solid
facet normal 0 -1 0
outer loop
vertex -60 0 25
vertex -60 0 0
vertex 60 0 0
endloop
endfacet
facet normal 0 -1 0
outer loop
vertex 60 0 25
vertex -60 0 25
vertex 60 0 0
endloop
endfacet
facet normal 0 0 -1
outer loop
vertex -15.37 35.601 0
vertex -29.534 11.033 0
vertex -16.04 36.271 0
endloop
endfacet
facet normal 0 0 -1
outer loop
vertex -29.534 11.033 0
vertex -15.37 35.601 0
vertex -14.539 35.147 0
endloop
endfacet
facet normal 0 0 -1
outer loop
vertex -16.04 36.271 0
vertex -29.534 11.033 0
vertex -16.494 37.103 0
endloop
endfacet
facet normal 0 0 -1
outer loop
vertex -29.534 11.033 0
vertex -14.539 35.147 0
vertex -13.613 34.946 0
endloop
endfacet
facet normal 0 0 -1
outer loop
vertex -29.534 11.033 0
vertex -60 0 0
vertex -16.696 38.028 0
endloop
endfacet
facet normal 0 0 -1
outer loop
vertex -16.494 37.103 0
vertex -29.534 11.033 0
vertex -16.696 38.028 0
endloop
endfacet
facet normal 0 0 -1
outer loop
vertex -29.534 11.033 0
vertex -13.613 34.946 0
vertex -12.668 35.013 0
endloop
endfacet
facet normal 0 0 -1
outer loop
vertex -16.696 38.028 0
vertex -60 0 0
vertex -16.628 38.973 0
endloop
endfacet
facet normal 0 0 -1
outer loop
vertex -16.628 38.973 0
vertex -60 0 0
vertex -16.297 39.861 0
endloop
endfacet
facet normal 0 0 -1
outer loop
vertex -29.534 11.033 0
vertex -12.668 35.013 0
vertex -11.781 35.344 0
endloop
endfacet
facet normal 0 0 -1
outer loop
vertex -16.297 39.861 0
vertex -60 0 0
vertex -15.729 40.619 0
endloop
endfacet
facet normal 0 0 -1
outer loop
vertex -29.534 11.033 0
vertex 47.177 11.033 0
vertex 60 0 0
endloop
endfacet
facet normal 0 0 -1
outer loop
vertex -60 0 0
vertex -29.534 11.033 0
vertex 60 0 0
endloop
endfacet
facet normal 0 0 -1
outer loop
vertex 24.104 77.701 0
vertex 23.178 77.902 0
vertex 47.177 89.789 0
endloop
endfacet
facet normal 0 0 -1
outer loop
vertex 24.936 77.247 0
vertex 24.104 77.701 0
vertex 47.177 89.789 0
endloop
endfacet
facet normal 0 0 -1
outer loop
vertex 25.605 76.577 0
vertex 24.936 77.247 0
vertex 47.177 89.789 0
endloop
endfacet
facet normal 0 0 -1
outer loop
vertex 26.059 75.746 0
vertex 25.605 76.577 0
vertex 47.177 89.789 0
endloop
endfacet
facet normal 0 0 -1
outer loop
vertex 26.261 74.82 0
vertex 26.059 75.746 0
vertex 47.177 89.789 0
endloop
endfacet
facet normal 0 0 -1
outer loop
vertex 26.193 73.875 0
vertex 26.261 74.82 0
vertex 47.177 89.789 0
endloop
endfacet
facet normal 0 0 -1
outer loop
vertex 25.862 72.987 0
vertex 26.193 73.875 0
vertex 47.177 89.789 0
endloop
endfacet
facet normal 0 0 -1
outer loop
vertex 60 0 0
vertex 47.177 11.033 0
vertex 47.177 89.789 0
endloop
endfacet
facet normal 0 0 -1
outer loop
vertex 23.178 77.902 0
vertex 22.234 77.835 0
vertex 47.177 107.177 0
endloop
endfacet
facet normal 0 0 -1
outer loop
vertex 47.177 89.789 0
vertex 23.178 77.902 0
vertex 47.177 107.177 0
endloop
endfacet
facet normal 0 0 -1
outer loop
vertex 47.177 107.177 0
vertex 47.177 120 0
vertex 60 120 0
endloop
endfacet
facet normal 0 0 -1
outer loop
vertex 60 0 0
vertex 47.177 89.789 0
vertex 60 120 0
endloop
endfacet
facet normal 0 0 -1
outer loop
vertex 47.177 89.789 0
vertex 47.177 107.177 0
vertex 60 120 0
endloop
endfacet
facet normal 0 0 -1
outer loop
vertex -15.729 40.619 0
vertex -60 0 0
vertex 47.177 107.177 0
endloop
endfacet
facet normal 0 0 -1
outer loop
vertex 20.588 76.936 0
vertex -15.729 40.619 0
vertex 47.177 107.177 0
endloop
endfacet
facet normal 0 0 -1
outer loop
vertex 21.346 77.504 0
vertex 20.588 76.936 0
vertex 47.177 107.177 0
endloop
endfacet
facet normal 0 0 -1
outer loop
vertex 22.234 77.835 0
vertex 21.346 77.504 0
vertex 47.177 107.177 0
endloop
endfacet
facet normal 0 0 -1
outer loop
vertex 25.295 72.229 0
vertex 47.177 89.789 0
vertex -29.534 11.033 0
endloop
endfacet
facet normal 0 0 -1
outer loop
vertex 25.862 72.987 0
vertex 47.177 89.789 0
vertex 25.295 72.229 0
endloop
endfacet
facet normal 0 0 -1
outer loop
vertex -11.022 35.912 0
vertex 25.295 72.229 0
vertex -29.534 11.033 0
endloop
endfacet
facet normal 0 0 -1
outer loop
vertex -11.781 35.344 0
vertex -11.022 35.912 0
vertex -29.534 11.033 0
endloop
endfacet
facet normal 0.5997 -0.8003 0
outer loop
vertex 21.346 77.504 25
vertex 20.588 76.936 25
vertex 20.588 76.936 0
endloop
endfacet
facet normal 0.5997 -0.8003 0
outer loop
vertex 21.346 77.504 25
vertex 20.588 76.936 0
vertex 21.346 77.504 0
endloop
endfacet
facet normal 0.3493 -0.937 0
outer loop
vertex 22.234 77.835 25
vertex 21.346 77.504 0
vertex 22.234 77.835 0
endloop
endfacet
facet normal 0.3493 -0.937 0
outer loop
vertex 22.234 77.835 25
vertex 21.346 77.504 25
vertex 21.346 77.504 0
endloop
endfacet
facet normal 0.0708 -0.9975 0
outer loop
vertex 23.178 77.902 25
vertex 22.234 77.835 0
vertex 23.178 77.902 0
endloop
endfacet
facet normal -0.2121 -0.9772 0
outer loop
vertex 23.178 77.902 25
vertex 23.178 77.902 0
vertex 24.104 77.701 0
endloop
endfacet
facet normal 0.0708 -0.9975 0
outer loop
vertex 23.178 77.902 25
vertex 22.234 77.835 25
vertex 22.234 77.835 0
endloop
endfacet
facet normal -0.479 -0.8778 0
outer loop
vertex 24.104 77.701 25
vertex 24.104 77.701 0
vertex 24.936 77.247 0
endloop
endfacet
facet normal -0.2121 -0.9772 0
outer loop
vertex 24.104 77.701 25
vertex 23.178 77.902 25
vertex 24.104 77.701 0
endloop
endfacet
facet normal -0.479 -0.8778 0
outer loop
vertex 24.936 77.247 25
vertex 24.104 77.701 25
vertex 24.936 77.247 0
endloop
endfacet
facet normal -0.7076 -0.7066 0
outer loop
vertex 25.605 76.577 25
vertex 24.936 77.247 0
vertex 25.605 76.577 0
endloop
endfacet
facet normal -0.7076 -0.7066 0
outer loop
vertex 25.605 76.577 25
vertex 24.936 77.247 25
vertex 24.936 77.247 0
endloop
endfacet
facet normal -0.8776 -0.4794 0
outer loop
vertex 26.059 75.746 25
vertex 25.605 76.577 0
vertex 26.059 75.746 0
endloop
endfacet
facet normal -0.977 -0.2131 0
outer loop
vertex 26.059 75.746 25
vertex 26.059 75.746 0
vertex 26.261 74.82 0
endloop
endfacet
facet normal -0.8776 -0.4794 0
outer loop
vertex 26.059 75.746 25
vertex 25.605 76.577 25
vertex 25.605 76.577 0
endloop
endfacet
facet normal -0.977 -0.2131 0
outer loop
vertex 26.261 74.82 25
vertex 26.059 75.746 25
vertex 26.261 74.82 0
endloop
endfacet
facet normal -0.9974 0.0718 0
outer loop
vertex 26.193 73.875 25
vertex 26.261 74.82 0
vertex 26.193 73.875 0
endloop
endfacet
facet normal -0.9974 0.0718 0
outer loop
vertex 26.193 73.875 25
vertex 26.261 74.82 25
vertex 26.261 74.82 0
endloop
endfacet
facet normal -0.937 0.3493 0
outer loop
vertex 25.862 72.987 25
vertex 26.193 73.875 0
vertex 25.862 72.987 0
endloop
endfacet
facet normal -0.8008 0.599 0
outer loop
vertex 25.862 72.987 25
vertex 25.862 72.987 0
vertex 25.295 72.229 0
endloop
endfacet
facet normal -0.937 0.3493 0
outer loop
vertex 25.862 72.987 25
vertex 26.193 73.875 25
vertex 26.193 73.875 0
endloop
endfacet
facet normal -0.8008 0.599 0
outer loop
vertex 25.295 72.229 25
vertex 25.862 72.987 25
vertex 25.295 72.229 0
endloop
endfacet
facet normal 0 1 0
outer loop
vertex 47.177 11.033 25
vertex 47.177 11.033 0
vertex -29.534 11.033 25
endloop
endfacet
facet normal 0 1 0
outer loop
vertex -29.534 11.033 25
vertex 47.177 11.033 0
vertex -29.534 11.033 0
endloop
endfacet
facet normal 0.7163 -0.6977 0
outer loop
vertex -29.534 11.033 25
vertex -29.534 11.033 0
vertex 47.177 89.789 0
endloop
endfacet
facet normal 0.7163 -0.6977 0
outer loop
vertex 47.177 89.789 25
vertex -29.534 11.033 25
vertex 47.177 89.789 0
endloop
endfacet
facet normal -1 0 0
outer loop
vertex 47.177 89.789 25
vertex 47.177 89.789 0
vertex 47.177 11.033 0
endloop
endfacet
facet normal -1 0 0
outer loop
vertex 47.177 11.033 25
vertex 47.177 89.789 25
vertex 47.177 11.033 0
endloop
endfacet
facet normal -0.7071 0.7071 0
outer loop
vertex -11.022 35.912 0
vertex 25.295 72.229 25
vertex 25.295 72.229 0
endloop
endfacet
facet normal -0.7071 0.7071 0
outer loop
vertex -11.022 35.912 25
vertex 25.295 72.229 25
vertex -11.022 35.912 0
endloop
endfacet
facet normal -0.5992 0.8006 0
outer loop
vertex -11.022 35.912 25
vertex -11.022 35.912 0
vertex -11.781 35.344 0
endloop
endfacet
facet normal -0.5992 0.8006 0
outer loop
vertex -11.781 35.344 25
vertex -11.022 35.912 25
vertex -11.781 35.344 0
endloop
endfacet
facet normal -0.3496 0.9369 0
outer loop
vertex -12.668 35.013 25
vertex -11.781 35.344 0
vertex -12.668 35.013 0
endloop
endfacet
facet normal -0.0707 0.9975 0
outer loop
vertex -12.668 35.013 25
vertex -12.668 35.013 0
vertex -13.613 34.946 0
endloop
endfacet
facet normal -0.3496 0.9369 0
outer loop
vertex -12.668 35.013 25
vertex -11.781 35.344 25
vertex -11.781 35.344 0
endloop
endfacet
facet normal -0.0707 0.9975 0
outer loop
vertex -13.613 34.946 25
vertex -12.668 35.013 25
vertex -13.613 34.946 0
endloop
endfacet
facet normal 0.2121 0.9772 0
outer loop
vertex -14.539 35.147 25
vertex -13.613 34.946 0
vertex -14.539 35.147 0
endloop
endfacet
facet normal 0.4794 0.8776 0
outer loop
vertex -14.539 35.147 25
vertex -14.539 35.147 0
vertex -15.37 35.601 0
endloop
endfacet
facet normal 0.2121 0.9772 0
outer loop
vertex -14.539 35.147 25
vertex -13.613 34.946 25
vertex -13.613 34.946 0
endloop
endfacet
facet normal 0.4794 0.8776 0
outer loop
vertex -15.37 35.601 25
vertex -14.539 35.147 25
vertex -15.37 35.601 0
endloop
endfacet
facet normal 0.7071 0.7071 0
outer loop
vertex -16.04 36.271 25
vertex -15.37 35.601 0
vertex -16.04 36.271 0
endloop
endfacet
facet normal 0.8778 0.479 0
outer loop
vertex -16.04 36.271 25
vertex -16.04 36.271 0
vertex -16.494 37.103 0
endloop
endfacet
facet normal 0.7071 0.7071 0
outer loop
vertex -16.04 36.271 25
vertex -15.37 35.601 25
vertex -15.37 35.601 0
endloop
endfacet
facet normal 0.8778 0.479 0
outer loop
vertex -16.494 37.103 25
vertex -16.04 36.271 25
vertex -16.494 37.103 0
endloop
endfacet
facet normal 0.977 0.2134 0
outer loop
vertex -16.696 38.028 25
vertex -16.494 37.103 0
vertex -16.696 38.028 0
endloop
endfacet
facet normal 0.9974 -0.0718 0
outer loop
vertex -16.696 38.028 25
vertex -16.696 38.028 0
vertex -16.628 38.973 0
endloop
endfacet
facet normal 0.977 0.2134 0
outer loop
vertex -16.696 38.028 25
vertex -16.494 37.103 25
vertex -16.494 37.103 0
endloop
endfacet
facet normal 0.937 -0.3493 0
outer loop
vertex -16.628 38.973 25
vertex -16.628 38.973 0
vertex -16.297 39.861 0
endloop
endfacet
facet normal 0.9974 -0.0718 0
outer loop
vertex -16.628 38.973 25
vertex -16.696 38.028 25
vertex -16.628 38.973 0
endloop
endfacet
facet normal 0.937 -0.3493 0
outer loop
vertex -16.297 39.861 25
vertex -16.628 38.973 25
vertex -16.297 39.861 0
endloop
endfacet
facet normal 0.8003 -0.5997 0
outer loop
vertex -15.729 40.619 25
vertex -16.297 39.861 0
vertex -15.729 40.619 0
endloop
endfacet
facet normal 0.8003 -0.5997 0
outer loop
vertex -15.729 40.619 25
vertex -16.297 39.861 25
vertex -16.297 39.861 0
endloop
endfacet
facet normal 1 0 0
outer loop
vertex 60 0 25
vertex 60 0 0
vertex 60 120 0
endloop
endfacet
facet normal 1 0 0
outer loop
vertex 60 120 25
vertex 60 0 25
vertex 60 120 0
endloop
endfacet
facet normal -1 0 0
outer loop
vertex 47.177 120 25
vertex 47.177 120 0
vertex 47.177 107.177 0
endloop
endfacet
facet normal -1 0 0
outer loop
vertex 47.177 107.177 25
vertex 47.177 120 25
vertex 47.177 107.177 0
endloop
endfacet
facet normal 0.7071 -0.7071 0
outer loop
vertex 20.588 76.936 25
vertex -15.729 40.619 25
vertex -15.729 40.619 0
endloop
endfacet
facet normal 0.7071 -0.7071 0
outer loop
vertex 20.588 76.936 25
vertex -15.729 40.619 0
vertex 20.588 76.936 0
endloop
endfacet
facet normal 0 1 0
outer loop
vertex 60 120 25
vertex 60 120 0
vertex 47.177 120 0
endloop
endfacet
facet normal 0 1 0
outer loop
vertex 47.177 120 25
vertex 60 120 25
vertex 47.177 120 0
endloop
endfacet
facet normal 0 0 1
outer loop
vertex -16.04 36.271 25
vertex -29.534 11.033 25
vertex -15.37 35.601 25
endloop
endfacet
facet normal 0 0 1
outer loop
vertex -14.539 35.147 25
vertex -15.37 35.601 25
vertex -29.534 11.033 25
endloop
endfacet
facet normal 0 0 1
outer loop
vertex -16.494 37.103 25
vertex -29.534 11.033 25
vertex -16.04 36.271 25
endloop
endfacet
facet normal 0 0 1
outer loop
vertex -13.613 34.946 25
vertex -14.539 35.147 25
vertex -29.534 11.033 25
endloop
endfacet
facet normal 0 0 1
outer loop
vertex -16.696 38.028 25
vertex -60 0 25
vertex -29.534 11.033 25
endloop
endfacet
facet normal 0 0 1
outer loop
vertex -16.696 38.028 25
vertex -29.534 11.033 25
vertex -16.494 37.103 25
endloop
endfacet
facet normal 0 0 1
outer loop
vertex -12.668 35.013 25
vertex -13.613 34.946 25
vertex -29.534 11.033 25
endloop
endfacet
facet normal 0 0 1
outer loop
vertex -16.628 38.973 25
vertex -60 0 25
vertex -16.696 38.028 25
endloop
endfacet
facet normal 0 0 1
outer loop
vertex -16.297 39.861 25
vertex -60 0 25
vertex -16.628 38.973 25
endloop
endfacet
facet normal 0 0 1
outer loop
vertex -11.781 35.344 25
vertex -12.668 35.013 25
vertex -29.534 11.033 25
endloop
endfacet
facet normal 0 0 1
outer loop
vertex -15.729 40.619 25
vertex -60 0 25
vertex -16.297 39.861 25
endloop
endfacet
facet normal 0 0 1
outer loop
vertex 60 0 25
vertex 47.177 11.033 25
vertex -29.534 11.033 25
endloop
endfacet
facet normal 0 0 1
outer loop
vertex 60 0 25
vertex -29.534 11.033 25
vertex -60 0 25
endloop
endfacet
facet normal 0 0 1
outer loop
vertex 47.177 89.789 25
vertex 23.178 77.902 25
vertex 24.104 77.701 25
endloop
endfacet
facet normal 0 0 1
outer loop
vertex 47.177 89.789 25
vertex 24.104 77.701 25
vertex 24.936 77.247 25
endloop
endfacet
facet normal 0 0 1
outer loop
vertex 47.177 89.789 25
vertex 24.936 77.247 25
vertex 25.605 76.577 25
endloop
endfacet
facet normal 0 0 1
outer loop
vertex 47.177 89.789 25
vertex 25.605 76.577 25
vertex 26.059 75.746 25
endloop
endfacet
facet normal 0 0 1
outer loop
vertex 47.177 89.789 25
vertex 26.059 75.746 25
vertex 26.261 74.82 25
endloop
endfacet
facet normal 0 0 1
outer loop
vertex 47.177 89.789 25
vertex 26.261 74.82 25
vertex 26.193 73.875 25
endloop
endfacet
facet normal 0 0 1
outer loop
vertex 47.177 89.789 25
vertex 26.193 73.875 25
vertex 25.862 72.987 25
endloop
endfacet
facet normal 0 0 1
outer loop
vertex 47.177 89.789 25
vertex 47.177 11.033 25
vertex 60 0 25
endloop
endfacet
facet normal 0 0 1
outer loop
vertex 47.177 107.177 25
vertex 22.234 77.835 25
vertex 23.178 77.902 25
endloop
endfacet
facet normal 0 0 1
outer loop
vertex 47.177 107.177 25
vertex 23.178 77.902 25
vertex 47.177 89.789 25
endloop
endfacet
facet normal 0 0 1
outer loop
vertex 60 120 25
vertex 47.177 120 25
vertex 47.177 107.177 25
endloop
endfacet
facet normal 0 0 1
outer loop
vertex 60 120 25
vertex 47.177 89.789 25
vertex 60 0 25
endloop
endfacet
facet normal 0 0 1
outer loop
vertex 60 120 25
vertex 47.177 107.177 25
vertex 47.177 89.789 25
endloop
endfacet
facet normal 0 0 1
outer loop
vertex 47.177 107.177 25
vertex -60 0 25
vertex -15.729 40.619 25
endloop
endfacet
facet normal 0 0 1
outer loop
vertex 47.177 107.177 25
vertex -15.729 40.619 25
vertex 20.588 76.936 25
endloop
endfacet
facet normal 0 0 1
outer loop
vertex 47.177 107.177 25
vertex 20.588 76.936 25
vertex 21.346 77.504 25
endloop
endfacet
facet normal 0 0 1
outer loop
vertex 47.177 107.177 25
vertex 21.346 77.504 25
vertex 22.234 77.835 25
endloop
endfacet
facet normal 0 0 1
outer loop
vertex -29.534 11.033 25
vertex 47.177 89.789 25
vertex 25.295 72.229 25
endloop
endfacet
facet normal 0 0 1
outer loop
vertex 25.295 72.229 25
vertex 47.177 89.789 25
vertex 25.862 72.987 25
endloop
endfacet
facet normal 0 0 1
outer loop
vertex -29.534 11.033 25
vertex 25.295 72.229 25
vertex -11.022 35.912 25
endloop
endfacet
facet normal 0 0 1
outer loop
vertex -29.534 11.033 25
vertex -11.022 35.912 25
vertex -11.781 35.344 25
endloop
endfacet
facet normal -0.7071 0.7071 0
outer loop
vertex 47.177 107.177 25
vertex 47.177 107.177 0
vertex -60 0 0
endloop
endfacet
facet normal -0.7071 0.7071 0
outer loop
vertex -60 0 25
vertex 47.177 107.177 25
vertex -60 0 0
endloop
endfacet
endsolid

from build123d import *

# Parameters (mm, degrees)
BOSS_EXTRUDE1_DEPTH = 25
CUT_EXTRUDE1_DEPTH  = 25


with BuildPart() as part:
    # Sketch1 → Boss-Extrude1 (new body)
    with BuildSketch(Plane.XY):
        Polygon((47.177011042, 107.177011042), (-60, 0), (60, 0), (60, 120), (47.177011042, 120), align=None)
        Polygon((47.177011042, 89.789277975), (47.177011042, 11.03307526), (-29.533576018, 11.03307526), align=None, mode=Mode.SUBTRACT)
    extrude(amount=BOSS_EXTRUDE1_DEPTH)

    # Sketch2 → Cut-Extrude1 (cut)
    with BuildSketch(Plane.XY.offset(25)):
        with BuildLine():
            Line((25.294500052, 72.229110711), (-11.022426811, 35.912183847))
            ThreePointArc((-11.022426811, 35.912183847), (-15.729304171, 35.912183847), (-15.729304171, 40.619061207))
            Line((-15.729304171, 40.619061207), (20.587622692, 76.93598807))
            ThreePointArc((20.587622692, 76.93598807), (25.294500052, 76.93598807), (25.294500052, 72.229110711))
        make_face()
    extrude(amount=-CUT_EXTRUDE1_DEPTH, mode=Mode.SUBTRACT)


solid = part.part
